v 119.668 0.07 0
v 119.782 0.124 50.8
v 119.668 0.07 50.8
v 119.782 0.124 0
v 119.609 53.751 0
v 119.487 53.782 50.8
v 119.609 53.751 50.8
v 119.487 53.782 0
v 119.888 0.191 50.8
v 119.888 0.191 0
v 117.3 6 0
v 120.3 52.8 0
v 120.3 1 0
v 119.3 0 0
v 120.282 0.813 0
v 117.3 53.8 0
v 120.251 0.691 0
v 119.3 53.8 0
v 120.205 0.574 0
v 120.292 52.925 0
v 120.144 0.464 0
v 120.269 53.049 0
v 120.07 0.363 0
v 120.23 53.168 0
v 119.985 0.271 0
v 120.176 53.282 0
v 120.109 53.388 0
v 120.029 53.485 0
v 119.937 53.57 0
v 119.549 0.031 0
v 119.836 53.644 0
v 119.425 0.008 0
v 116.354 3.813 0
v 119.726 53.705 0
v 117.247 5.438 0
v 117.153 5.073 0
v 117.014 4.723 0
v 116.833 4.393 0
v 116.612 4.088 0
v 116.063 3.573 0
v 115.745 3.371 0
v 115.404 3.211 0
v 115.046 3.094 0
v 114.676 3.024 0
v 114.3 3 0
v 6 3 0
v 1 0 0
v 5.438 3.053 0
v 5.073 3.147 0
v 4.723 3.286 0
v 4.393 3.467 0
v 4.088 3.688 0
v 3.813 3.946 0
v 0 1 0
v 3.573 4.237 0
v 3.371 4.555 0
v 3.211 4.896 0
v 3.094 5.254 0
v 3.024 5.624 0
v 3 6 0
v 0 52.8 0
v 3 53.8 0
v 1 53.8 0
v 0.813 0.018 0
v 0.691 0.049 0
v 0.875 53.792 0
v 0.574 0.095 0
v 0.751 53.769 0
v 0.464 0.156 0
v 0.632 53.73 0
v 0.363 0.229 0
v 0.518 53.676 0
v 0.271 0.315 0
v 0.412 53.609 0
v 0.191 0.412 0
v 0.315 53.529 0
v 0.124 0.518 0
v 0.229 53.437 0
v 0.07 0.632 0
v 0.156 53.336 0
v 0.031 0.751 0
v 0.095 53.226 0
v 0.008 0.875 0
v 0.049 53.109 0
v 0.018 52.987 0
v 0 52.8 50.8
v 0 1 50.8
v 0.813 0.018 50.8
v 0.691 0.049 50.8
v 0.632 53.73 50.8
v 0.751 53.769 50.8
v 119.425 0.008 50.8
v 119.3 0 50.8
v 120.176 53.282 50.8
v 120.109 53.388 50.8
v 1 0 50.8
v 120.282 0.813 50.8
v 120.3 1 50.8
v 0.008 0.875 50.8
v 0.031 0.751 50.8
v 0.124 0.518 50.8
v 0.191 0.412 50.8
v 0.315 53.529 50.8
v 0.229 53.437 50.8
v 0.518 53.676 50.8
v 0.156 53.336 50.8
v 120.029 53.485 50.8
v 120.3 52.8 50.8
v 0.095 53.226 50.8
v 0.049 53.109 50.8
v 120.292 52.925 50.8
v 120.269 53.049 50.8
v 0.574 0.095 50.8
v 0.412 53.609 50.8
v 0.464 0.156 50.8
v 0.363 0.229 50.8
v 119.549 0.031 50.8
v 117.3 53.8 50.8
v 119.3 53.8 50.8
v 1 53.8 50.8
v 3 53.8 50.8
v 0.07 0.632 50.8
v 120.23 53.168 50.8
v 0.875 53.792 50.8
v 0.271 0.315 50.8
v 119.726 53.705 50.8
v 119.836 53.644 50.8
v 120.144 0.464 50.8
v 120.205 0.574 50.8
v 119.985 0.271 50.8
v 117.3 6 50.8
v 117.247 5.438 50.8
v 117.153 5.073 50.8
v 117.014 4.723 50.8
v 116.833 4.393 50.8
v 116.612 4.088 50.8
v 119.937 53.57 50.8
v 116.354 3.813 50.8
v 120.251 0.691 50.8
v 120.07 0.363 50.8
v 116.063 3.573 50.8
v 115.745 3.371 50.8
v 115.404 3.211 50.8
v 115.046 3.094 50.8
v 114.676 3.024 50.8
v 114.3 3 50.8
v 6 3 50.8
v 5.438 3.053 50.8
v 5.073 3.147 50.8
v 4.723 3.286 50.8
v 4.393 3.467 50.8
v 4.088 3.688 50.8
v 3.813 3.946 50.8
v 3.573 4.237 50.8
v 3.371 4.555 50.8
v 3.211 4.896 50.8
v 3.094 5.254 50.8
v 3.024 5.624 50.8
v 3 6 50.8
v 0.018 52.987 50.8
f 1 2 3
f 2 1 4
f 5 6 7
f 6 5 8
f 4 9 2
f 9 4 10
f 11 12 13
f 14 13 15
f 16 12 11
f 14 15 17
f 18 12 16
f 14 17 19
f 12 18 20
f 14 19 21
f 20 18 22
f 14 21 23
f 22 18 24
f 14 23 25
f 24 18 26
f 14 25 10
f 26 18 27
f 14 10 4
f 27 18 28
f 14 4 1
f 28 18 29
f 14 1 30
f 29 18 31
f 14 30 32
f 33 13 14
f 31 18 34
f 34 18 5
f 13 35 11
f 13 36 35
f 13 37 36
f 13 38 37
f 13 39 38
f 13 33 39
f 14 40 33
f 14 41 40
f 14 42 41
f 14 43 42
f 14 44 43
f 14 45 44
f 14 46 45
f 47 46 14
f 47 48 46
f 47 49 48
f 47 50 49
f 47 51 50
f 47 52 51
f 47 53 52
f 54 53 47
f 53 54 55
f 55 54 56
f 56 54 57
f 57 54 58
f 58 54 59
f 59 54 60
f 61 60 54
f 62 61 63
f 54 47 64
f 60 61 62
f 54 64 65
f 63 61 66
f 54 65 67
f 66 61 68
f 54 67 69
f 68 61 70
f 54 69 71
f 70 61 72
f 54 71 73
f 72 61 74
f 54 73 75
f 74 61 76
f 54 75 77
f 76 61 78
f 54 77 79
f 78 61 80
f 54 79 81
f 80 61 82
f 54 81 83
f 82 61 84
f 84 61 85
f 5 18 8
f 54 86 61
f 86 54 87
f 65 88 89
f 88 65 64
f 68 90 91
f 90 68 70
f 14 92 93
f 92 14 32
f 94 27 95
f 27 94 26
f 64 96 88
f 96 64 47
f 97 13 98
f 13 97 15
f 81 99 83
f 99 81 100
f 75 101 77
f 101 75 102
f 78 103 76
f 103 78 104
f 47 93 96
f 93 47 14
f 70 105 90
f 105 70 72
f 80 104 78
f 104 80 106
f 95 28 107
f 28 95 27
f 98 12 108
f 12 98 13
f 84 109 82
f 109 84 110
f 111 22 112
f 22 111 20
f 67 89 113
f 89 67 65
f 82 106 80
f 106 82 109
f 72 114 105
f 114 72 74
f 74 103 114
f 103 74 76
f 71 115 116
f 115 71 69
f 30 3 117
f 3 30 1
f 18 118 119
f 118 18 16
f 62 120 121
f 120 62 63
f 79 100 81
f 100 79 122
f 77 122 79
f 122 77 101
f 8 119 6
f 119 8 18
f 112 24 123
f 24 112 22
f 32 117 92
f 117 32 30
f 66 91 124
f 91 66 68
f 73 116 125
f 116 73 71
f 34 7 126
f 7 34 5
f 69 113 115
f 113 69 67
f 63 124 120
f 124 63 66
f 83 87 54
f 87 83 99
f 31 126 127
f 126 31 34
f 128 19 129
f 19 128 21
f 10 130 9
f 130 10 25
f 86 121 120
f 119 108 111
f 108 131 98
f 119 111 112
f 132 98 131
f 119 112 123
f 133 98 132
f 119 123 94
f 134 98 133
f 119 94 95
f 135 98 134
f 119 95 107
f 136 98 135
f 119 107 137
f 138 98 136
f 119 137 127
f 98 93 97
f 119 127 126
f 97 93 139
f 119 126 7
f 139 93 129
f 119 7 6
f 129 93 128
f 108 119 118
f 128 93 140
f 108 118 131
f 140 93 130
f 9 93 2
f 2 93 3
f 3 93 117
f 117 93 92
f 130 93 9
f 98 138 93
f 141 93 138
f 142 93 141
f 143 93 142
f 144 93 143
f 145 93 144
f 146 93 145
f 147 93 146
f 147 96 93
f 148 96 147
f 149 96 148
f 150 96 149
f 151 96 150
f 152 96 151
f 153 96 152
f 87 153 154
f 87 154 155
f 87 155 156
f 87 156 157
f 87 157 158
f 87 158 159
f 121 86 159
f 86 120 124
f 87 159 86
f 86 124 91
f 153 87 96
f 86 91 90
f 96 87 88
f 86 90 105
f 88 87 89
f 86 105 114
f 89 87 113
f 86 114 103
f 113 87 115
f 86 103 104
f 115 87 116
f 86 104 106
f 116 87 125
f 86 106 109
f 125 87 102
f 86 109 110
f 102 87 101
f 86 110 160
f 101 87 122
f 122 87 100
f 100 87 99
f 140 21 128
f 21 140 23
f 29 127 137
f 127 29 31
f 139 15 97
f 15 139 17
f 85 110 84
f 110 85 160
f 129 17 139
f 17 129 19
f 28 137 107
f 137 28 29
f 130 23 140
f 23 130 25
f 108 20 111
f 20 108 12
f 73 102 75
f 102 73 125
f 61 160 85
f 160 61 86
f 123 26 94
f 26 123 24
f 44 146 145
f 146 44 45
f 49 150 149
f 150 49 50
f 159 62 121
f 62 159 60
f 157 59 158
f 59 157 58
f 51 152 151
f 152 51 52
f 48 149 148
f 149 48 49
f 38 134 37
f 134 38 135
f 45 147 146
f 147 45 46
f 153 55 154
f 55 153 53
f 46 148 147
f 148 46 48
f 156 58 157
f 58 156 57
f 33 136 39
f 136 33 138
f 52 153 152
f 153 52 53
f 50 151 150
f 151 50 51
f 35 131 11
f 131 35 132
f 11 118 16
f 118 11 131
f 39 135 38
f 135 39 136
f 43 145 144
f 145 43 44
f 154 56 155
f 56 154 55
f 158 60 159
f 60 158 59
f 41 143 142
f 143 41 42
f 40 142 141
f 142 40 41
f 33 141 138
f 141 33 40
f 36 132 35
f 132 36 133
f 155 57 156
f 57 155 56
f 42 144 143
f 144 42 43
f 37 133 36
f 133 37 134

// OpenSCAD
// file: ../common/extrusions.scad
//
// Common extrusions
// Author: Joseph M. Joy FTC 12598 mentor
//
EPSILON = 0.01; // For moving things to properly punch out holes

// Makes a flat (horizontal) "T":
//
// --------------
// |wtXht     --|
// ----\     /---
//      |wbX|
//      |hb |
//      -----
//<xoff>
//
// It could also be an inverted L shape
// if the lower (vertical) bar is wide enough to extend beyond the right 
// hand side of the upper (horizontal) bar.
//
// {xoff} is horizontal distance to the start of the bar.
// {ro} curve of convex corners (not shown above)
// {ri} is the radius of two concave curves
// curve shown as diagonals above.
// t is the thickness of the plate - in
// the z direction.
// Origin is the left hand corner
// of the bounding rectangle.
//
// WARNING: If {ro} and {ri} are too large it will generate sharp
// extrusion artifacts because the straight surfaces are not large to accomodate
// the inner-radius curves.
// 
module T_channelOld(wb, hb, wt, ht, xoff, r, t) {
    ow = 2*wt; // wide enough to 
    oh = 2*(hb+ht); // high enough to descend below the shape

    difference() {
        cube([wt, hb+ht, t]);
        translate([xoff-ow,hb-oh,-EPSILON]) oblong(ow, oh, r, t+2*EPSILON);
        translate([xoff+wb,hb-oh,-EPSILON]) oblong(ow, oh, r, t+2*EPSILON);
    }
}


module T_channel(wb, hb, wt, ht, xoff, ro, ri, t) {
    
    // ow and oh are used to create cutout patterns
    ow = 2*wt; // wide enough to extend to the left and right of shape
    oh = 2*(hb+ht); // high enough to descend below the shape
    
    // Dimensions of the plate that will be cut out - it is just
    // big enough so that the inner-radii can be cut out, no more.
    wp = wb + 2*ri + 2*EPSILON; // dimensions of plate to be cut out
    hp = max(ro, ri) + 2*EPSILON;
    xoffp = xoff - ri - EPSILON;
    yoffp = hb - max(ro, ri) - EPSILON;
    difference() {
        translate([xoffp, yoffp, 0]) cube([wp, hp, t]);
        translate([xoff-ow,hb-oh,-EPSILON]) oblong(ow, oh, ri, t+2*EPSILON);
        translate([xoff+wb,hb-oh,-EPSILON]) oblong(ow, oh, ri, t+2*EPSILON);
    }
    translate([xoff, 0, 0]) oblong(wb, hb, ro, t);
    translate([0, hb, 0]) oblong(wt, ht, ro, t);
}


// Makes a flat (horizontal) "O":
//
// /-------------\
// |             |
// | /--------\  |
// | |         | |
// | |         | |
// | |         | |
// | \         / |
// |  ---------  |
// \------------/
//
//
// It could also be a U or L
// if the oblong hole extends outside the outer
// boundary.
//
// ({xoff},{yoff} is origin of bounding-rectangle of the oblong hole
// {(wo}, {ho}) is the bounding box of the outer oblong.
// {(wi}, {hi}) is the bounding box of the inner (hole) oblong.
// {r} is the radius of the
// curve shown as diagonals above.
// t is the thickness of the plate - in
// the z direction.
// Origin is the left hand corner
// of the bounding rectangle.
// 
module O_channel(wo, ho, wi, hi, xoff, yoff, ro, ri, t) {
    difference() {
        oblong(wo, ho, ro, t);
        translate([xoff, yoff, -EPSILON]) oblong(wi, hi, ri, t+2*EPSILON);
    }
}


// A rectangular prism that fits within {w} x {h} and
// has rounded corners with radius {r} on all 4 sides.
// The actual radius may be reduced so keep the oblong
// viable. {t} is the thickness (in z).
module oblong(w, h, r, t) {
    r = min(r, w/2-EPSILON, h/2-EPSILON);
    translate([r, r, 0])
    linear_extrude(height = t, center = false, convexity = 10) {
        offset(r = r) square([w-2*r, h-2*r]);
    }
}

// A cube that fits within ({w}, {h}, {d}) and has
// all corners rounded with radius r.
module rounded_cube(w, h, d, r) {
        r =  min(r, w/2-EPSILON, h/2-EPSILON, d/2-EPSILON);
        di = 2*r;
    translate([r, r, r]) {
        minkowski() {
            echo(di);
            cube([w-di, h-di, d-di]);
            sphere(r=r);
        }
    }
}

//
// Example code
//
wb = 10;
hb = 20;
wt = 40;
ht = 30;
t = 5;
ro = 5;
ri = 2;
xoff = 10;
move = 30;
$fn = 50;
oblong(wb, hb, ro, t);
translate([0, move, 0]) rounded_cube(wb, hb, t, ro);//, $fn=100);
translate([move, 0, 0]) T_channel(wb, hb, wt, ht, xoff, 5, 1, t);
translate([move, 2*move, 0]) O_channel(wt, hb+ht, wb, 10*hb, xoff, xoff, ro, ri, t);
// main file
use <../common/extrusions.scad>
LARGE = 100;

module marker_thing() {
    w = 4.5*25.4;
    thick = 3;
    d = 2*25.4;
    h = 2*25.4;
    ri =  3;
    ro = 1;
    
     O_channel(
    w+2*thick, h+thick, 
    w, LARGE, 
    thick, thick, ro, ri, d);
    //cube([w, d, h]);
}



marker_thing();
